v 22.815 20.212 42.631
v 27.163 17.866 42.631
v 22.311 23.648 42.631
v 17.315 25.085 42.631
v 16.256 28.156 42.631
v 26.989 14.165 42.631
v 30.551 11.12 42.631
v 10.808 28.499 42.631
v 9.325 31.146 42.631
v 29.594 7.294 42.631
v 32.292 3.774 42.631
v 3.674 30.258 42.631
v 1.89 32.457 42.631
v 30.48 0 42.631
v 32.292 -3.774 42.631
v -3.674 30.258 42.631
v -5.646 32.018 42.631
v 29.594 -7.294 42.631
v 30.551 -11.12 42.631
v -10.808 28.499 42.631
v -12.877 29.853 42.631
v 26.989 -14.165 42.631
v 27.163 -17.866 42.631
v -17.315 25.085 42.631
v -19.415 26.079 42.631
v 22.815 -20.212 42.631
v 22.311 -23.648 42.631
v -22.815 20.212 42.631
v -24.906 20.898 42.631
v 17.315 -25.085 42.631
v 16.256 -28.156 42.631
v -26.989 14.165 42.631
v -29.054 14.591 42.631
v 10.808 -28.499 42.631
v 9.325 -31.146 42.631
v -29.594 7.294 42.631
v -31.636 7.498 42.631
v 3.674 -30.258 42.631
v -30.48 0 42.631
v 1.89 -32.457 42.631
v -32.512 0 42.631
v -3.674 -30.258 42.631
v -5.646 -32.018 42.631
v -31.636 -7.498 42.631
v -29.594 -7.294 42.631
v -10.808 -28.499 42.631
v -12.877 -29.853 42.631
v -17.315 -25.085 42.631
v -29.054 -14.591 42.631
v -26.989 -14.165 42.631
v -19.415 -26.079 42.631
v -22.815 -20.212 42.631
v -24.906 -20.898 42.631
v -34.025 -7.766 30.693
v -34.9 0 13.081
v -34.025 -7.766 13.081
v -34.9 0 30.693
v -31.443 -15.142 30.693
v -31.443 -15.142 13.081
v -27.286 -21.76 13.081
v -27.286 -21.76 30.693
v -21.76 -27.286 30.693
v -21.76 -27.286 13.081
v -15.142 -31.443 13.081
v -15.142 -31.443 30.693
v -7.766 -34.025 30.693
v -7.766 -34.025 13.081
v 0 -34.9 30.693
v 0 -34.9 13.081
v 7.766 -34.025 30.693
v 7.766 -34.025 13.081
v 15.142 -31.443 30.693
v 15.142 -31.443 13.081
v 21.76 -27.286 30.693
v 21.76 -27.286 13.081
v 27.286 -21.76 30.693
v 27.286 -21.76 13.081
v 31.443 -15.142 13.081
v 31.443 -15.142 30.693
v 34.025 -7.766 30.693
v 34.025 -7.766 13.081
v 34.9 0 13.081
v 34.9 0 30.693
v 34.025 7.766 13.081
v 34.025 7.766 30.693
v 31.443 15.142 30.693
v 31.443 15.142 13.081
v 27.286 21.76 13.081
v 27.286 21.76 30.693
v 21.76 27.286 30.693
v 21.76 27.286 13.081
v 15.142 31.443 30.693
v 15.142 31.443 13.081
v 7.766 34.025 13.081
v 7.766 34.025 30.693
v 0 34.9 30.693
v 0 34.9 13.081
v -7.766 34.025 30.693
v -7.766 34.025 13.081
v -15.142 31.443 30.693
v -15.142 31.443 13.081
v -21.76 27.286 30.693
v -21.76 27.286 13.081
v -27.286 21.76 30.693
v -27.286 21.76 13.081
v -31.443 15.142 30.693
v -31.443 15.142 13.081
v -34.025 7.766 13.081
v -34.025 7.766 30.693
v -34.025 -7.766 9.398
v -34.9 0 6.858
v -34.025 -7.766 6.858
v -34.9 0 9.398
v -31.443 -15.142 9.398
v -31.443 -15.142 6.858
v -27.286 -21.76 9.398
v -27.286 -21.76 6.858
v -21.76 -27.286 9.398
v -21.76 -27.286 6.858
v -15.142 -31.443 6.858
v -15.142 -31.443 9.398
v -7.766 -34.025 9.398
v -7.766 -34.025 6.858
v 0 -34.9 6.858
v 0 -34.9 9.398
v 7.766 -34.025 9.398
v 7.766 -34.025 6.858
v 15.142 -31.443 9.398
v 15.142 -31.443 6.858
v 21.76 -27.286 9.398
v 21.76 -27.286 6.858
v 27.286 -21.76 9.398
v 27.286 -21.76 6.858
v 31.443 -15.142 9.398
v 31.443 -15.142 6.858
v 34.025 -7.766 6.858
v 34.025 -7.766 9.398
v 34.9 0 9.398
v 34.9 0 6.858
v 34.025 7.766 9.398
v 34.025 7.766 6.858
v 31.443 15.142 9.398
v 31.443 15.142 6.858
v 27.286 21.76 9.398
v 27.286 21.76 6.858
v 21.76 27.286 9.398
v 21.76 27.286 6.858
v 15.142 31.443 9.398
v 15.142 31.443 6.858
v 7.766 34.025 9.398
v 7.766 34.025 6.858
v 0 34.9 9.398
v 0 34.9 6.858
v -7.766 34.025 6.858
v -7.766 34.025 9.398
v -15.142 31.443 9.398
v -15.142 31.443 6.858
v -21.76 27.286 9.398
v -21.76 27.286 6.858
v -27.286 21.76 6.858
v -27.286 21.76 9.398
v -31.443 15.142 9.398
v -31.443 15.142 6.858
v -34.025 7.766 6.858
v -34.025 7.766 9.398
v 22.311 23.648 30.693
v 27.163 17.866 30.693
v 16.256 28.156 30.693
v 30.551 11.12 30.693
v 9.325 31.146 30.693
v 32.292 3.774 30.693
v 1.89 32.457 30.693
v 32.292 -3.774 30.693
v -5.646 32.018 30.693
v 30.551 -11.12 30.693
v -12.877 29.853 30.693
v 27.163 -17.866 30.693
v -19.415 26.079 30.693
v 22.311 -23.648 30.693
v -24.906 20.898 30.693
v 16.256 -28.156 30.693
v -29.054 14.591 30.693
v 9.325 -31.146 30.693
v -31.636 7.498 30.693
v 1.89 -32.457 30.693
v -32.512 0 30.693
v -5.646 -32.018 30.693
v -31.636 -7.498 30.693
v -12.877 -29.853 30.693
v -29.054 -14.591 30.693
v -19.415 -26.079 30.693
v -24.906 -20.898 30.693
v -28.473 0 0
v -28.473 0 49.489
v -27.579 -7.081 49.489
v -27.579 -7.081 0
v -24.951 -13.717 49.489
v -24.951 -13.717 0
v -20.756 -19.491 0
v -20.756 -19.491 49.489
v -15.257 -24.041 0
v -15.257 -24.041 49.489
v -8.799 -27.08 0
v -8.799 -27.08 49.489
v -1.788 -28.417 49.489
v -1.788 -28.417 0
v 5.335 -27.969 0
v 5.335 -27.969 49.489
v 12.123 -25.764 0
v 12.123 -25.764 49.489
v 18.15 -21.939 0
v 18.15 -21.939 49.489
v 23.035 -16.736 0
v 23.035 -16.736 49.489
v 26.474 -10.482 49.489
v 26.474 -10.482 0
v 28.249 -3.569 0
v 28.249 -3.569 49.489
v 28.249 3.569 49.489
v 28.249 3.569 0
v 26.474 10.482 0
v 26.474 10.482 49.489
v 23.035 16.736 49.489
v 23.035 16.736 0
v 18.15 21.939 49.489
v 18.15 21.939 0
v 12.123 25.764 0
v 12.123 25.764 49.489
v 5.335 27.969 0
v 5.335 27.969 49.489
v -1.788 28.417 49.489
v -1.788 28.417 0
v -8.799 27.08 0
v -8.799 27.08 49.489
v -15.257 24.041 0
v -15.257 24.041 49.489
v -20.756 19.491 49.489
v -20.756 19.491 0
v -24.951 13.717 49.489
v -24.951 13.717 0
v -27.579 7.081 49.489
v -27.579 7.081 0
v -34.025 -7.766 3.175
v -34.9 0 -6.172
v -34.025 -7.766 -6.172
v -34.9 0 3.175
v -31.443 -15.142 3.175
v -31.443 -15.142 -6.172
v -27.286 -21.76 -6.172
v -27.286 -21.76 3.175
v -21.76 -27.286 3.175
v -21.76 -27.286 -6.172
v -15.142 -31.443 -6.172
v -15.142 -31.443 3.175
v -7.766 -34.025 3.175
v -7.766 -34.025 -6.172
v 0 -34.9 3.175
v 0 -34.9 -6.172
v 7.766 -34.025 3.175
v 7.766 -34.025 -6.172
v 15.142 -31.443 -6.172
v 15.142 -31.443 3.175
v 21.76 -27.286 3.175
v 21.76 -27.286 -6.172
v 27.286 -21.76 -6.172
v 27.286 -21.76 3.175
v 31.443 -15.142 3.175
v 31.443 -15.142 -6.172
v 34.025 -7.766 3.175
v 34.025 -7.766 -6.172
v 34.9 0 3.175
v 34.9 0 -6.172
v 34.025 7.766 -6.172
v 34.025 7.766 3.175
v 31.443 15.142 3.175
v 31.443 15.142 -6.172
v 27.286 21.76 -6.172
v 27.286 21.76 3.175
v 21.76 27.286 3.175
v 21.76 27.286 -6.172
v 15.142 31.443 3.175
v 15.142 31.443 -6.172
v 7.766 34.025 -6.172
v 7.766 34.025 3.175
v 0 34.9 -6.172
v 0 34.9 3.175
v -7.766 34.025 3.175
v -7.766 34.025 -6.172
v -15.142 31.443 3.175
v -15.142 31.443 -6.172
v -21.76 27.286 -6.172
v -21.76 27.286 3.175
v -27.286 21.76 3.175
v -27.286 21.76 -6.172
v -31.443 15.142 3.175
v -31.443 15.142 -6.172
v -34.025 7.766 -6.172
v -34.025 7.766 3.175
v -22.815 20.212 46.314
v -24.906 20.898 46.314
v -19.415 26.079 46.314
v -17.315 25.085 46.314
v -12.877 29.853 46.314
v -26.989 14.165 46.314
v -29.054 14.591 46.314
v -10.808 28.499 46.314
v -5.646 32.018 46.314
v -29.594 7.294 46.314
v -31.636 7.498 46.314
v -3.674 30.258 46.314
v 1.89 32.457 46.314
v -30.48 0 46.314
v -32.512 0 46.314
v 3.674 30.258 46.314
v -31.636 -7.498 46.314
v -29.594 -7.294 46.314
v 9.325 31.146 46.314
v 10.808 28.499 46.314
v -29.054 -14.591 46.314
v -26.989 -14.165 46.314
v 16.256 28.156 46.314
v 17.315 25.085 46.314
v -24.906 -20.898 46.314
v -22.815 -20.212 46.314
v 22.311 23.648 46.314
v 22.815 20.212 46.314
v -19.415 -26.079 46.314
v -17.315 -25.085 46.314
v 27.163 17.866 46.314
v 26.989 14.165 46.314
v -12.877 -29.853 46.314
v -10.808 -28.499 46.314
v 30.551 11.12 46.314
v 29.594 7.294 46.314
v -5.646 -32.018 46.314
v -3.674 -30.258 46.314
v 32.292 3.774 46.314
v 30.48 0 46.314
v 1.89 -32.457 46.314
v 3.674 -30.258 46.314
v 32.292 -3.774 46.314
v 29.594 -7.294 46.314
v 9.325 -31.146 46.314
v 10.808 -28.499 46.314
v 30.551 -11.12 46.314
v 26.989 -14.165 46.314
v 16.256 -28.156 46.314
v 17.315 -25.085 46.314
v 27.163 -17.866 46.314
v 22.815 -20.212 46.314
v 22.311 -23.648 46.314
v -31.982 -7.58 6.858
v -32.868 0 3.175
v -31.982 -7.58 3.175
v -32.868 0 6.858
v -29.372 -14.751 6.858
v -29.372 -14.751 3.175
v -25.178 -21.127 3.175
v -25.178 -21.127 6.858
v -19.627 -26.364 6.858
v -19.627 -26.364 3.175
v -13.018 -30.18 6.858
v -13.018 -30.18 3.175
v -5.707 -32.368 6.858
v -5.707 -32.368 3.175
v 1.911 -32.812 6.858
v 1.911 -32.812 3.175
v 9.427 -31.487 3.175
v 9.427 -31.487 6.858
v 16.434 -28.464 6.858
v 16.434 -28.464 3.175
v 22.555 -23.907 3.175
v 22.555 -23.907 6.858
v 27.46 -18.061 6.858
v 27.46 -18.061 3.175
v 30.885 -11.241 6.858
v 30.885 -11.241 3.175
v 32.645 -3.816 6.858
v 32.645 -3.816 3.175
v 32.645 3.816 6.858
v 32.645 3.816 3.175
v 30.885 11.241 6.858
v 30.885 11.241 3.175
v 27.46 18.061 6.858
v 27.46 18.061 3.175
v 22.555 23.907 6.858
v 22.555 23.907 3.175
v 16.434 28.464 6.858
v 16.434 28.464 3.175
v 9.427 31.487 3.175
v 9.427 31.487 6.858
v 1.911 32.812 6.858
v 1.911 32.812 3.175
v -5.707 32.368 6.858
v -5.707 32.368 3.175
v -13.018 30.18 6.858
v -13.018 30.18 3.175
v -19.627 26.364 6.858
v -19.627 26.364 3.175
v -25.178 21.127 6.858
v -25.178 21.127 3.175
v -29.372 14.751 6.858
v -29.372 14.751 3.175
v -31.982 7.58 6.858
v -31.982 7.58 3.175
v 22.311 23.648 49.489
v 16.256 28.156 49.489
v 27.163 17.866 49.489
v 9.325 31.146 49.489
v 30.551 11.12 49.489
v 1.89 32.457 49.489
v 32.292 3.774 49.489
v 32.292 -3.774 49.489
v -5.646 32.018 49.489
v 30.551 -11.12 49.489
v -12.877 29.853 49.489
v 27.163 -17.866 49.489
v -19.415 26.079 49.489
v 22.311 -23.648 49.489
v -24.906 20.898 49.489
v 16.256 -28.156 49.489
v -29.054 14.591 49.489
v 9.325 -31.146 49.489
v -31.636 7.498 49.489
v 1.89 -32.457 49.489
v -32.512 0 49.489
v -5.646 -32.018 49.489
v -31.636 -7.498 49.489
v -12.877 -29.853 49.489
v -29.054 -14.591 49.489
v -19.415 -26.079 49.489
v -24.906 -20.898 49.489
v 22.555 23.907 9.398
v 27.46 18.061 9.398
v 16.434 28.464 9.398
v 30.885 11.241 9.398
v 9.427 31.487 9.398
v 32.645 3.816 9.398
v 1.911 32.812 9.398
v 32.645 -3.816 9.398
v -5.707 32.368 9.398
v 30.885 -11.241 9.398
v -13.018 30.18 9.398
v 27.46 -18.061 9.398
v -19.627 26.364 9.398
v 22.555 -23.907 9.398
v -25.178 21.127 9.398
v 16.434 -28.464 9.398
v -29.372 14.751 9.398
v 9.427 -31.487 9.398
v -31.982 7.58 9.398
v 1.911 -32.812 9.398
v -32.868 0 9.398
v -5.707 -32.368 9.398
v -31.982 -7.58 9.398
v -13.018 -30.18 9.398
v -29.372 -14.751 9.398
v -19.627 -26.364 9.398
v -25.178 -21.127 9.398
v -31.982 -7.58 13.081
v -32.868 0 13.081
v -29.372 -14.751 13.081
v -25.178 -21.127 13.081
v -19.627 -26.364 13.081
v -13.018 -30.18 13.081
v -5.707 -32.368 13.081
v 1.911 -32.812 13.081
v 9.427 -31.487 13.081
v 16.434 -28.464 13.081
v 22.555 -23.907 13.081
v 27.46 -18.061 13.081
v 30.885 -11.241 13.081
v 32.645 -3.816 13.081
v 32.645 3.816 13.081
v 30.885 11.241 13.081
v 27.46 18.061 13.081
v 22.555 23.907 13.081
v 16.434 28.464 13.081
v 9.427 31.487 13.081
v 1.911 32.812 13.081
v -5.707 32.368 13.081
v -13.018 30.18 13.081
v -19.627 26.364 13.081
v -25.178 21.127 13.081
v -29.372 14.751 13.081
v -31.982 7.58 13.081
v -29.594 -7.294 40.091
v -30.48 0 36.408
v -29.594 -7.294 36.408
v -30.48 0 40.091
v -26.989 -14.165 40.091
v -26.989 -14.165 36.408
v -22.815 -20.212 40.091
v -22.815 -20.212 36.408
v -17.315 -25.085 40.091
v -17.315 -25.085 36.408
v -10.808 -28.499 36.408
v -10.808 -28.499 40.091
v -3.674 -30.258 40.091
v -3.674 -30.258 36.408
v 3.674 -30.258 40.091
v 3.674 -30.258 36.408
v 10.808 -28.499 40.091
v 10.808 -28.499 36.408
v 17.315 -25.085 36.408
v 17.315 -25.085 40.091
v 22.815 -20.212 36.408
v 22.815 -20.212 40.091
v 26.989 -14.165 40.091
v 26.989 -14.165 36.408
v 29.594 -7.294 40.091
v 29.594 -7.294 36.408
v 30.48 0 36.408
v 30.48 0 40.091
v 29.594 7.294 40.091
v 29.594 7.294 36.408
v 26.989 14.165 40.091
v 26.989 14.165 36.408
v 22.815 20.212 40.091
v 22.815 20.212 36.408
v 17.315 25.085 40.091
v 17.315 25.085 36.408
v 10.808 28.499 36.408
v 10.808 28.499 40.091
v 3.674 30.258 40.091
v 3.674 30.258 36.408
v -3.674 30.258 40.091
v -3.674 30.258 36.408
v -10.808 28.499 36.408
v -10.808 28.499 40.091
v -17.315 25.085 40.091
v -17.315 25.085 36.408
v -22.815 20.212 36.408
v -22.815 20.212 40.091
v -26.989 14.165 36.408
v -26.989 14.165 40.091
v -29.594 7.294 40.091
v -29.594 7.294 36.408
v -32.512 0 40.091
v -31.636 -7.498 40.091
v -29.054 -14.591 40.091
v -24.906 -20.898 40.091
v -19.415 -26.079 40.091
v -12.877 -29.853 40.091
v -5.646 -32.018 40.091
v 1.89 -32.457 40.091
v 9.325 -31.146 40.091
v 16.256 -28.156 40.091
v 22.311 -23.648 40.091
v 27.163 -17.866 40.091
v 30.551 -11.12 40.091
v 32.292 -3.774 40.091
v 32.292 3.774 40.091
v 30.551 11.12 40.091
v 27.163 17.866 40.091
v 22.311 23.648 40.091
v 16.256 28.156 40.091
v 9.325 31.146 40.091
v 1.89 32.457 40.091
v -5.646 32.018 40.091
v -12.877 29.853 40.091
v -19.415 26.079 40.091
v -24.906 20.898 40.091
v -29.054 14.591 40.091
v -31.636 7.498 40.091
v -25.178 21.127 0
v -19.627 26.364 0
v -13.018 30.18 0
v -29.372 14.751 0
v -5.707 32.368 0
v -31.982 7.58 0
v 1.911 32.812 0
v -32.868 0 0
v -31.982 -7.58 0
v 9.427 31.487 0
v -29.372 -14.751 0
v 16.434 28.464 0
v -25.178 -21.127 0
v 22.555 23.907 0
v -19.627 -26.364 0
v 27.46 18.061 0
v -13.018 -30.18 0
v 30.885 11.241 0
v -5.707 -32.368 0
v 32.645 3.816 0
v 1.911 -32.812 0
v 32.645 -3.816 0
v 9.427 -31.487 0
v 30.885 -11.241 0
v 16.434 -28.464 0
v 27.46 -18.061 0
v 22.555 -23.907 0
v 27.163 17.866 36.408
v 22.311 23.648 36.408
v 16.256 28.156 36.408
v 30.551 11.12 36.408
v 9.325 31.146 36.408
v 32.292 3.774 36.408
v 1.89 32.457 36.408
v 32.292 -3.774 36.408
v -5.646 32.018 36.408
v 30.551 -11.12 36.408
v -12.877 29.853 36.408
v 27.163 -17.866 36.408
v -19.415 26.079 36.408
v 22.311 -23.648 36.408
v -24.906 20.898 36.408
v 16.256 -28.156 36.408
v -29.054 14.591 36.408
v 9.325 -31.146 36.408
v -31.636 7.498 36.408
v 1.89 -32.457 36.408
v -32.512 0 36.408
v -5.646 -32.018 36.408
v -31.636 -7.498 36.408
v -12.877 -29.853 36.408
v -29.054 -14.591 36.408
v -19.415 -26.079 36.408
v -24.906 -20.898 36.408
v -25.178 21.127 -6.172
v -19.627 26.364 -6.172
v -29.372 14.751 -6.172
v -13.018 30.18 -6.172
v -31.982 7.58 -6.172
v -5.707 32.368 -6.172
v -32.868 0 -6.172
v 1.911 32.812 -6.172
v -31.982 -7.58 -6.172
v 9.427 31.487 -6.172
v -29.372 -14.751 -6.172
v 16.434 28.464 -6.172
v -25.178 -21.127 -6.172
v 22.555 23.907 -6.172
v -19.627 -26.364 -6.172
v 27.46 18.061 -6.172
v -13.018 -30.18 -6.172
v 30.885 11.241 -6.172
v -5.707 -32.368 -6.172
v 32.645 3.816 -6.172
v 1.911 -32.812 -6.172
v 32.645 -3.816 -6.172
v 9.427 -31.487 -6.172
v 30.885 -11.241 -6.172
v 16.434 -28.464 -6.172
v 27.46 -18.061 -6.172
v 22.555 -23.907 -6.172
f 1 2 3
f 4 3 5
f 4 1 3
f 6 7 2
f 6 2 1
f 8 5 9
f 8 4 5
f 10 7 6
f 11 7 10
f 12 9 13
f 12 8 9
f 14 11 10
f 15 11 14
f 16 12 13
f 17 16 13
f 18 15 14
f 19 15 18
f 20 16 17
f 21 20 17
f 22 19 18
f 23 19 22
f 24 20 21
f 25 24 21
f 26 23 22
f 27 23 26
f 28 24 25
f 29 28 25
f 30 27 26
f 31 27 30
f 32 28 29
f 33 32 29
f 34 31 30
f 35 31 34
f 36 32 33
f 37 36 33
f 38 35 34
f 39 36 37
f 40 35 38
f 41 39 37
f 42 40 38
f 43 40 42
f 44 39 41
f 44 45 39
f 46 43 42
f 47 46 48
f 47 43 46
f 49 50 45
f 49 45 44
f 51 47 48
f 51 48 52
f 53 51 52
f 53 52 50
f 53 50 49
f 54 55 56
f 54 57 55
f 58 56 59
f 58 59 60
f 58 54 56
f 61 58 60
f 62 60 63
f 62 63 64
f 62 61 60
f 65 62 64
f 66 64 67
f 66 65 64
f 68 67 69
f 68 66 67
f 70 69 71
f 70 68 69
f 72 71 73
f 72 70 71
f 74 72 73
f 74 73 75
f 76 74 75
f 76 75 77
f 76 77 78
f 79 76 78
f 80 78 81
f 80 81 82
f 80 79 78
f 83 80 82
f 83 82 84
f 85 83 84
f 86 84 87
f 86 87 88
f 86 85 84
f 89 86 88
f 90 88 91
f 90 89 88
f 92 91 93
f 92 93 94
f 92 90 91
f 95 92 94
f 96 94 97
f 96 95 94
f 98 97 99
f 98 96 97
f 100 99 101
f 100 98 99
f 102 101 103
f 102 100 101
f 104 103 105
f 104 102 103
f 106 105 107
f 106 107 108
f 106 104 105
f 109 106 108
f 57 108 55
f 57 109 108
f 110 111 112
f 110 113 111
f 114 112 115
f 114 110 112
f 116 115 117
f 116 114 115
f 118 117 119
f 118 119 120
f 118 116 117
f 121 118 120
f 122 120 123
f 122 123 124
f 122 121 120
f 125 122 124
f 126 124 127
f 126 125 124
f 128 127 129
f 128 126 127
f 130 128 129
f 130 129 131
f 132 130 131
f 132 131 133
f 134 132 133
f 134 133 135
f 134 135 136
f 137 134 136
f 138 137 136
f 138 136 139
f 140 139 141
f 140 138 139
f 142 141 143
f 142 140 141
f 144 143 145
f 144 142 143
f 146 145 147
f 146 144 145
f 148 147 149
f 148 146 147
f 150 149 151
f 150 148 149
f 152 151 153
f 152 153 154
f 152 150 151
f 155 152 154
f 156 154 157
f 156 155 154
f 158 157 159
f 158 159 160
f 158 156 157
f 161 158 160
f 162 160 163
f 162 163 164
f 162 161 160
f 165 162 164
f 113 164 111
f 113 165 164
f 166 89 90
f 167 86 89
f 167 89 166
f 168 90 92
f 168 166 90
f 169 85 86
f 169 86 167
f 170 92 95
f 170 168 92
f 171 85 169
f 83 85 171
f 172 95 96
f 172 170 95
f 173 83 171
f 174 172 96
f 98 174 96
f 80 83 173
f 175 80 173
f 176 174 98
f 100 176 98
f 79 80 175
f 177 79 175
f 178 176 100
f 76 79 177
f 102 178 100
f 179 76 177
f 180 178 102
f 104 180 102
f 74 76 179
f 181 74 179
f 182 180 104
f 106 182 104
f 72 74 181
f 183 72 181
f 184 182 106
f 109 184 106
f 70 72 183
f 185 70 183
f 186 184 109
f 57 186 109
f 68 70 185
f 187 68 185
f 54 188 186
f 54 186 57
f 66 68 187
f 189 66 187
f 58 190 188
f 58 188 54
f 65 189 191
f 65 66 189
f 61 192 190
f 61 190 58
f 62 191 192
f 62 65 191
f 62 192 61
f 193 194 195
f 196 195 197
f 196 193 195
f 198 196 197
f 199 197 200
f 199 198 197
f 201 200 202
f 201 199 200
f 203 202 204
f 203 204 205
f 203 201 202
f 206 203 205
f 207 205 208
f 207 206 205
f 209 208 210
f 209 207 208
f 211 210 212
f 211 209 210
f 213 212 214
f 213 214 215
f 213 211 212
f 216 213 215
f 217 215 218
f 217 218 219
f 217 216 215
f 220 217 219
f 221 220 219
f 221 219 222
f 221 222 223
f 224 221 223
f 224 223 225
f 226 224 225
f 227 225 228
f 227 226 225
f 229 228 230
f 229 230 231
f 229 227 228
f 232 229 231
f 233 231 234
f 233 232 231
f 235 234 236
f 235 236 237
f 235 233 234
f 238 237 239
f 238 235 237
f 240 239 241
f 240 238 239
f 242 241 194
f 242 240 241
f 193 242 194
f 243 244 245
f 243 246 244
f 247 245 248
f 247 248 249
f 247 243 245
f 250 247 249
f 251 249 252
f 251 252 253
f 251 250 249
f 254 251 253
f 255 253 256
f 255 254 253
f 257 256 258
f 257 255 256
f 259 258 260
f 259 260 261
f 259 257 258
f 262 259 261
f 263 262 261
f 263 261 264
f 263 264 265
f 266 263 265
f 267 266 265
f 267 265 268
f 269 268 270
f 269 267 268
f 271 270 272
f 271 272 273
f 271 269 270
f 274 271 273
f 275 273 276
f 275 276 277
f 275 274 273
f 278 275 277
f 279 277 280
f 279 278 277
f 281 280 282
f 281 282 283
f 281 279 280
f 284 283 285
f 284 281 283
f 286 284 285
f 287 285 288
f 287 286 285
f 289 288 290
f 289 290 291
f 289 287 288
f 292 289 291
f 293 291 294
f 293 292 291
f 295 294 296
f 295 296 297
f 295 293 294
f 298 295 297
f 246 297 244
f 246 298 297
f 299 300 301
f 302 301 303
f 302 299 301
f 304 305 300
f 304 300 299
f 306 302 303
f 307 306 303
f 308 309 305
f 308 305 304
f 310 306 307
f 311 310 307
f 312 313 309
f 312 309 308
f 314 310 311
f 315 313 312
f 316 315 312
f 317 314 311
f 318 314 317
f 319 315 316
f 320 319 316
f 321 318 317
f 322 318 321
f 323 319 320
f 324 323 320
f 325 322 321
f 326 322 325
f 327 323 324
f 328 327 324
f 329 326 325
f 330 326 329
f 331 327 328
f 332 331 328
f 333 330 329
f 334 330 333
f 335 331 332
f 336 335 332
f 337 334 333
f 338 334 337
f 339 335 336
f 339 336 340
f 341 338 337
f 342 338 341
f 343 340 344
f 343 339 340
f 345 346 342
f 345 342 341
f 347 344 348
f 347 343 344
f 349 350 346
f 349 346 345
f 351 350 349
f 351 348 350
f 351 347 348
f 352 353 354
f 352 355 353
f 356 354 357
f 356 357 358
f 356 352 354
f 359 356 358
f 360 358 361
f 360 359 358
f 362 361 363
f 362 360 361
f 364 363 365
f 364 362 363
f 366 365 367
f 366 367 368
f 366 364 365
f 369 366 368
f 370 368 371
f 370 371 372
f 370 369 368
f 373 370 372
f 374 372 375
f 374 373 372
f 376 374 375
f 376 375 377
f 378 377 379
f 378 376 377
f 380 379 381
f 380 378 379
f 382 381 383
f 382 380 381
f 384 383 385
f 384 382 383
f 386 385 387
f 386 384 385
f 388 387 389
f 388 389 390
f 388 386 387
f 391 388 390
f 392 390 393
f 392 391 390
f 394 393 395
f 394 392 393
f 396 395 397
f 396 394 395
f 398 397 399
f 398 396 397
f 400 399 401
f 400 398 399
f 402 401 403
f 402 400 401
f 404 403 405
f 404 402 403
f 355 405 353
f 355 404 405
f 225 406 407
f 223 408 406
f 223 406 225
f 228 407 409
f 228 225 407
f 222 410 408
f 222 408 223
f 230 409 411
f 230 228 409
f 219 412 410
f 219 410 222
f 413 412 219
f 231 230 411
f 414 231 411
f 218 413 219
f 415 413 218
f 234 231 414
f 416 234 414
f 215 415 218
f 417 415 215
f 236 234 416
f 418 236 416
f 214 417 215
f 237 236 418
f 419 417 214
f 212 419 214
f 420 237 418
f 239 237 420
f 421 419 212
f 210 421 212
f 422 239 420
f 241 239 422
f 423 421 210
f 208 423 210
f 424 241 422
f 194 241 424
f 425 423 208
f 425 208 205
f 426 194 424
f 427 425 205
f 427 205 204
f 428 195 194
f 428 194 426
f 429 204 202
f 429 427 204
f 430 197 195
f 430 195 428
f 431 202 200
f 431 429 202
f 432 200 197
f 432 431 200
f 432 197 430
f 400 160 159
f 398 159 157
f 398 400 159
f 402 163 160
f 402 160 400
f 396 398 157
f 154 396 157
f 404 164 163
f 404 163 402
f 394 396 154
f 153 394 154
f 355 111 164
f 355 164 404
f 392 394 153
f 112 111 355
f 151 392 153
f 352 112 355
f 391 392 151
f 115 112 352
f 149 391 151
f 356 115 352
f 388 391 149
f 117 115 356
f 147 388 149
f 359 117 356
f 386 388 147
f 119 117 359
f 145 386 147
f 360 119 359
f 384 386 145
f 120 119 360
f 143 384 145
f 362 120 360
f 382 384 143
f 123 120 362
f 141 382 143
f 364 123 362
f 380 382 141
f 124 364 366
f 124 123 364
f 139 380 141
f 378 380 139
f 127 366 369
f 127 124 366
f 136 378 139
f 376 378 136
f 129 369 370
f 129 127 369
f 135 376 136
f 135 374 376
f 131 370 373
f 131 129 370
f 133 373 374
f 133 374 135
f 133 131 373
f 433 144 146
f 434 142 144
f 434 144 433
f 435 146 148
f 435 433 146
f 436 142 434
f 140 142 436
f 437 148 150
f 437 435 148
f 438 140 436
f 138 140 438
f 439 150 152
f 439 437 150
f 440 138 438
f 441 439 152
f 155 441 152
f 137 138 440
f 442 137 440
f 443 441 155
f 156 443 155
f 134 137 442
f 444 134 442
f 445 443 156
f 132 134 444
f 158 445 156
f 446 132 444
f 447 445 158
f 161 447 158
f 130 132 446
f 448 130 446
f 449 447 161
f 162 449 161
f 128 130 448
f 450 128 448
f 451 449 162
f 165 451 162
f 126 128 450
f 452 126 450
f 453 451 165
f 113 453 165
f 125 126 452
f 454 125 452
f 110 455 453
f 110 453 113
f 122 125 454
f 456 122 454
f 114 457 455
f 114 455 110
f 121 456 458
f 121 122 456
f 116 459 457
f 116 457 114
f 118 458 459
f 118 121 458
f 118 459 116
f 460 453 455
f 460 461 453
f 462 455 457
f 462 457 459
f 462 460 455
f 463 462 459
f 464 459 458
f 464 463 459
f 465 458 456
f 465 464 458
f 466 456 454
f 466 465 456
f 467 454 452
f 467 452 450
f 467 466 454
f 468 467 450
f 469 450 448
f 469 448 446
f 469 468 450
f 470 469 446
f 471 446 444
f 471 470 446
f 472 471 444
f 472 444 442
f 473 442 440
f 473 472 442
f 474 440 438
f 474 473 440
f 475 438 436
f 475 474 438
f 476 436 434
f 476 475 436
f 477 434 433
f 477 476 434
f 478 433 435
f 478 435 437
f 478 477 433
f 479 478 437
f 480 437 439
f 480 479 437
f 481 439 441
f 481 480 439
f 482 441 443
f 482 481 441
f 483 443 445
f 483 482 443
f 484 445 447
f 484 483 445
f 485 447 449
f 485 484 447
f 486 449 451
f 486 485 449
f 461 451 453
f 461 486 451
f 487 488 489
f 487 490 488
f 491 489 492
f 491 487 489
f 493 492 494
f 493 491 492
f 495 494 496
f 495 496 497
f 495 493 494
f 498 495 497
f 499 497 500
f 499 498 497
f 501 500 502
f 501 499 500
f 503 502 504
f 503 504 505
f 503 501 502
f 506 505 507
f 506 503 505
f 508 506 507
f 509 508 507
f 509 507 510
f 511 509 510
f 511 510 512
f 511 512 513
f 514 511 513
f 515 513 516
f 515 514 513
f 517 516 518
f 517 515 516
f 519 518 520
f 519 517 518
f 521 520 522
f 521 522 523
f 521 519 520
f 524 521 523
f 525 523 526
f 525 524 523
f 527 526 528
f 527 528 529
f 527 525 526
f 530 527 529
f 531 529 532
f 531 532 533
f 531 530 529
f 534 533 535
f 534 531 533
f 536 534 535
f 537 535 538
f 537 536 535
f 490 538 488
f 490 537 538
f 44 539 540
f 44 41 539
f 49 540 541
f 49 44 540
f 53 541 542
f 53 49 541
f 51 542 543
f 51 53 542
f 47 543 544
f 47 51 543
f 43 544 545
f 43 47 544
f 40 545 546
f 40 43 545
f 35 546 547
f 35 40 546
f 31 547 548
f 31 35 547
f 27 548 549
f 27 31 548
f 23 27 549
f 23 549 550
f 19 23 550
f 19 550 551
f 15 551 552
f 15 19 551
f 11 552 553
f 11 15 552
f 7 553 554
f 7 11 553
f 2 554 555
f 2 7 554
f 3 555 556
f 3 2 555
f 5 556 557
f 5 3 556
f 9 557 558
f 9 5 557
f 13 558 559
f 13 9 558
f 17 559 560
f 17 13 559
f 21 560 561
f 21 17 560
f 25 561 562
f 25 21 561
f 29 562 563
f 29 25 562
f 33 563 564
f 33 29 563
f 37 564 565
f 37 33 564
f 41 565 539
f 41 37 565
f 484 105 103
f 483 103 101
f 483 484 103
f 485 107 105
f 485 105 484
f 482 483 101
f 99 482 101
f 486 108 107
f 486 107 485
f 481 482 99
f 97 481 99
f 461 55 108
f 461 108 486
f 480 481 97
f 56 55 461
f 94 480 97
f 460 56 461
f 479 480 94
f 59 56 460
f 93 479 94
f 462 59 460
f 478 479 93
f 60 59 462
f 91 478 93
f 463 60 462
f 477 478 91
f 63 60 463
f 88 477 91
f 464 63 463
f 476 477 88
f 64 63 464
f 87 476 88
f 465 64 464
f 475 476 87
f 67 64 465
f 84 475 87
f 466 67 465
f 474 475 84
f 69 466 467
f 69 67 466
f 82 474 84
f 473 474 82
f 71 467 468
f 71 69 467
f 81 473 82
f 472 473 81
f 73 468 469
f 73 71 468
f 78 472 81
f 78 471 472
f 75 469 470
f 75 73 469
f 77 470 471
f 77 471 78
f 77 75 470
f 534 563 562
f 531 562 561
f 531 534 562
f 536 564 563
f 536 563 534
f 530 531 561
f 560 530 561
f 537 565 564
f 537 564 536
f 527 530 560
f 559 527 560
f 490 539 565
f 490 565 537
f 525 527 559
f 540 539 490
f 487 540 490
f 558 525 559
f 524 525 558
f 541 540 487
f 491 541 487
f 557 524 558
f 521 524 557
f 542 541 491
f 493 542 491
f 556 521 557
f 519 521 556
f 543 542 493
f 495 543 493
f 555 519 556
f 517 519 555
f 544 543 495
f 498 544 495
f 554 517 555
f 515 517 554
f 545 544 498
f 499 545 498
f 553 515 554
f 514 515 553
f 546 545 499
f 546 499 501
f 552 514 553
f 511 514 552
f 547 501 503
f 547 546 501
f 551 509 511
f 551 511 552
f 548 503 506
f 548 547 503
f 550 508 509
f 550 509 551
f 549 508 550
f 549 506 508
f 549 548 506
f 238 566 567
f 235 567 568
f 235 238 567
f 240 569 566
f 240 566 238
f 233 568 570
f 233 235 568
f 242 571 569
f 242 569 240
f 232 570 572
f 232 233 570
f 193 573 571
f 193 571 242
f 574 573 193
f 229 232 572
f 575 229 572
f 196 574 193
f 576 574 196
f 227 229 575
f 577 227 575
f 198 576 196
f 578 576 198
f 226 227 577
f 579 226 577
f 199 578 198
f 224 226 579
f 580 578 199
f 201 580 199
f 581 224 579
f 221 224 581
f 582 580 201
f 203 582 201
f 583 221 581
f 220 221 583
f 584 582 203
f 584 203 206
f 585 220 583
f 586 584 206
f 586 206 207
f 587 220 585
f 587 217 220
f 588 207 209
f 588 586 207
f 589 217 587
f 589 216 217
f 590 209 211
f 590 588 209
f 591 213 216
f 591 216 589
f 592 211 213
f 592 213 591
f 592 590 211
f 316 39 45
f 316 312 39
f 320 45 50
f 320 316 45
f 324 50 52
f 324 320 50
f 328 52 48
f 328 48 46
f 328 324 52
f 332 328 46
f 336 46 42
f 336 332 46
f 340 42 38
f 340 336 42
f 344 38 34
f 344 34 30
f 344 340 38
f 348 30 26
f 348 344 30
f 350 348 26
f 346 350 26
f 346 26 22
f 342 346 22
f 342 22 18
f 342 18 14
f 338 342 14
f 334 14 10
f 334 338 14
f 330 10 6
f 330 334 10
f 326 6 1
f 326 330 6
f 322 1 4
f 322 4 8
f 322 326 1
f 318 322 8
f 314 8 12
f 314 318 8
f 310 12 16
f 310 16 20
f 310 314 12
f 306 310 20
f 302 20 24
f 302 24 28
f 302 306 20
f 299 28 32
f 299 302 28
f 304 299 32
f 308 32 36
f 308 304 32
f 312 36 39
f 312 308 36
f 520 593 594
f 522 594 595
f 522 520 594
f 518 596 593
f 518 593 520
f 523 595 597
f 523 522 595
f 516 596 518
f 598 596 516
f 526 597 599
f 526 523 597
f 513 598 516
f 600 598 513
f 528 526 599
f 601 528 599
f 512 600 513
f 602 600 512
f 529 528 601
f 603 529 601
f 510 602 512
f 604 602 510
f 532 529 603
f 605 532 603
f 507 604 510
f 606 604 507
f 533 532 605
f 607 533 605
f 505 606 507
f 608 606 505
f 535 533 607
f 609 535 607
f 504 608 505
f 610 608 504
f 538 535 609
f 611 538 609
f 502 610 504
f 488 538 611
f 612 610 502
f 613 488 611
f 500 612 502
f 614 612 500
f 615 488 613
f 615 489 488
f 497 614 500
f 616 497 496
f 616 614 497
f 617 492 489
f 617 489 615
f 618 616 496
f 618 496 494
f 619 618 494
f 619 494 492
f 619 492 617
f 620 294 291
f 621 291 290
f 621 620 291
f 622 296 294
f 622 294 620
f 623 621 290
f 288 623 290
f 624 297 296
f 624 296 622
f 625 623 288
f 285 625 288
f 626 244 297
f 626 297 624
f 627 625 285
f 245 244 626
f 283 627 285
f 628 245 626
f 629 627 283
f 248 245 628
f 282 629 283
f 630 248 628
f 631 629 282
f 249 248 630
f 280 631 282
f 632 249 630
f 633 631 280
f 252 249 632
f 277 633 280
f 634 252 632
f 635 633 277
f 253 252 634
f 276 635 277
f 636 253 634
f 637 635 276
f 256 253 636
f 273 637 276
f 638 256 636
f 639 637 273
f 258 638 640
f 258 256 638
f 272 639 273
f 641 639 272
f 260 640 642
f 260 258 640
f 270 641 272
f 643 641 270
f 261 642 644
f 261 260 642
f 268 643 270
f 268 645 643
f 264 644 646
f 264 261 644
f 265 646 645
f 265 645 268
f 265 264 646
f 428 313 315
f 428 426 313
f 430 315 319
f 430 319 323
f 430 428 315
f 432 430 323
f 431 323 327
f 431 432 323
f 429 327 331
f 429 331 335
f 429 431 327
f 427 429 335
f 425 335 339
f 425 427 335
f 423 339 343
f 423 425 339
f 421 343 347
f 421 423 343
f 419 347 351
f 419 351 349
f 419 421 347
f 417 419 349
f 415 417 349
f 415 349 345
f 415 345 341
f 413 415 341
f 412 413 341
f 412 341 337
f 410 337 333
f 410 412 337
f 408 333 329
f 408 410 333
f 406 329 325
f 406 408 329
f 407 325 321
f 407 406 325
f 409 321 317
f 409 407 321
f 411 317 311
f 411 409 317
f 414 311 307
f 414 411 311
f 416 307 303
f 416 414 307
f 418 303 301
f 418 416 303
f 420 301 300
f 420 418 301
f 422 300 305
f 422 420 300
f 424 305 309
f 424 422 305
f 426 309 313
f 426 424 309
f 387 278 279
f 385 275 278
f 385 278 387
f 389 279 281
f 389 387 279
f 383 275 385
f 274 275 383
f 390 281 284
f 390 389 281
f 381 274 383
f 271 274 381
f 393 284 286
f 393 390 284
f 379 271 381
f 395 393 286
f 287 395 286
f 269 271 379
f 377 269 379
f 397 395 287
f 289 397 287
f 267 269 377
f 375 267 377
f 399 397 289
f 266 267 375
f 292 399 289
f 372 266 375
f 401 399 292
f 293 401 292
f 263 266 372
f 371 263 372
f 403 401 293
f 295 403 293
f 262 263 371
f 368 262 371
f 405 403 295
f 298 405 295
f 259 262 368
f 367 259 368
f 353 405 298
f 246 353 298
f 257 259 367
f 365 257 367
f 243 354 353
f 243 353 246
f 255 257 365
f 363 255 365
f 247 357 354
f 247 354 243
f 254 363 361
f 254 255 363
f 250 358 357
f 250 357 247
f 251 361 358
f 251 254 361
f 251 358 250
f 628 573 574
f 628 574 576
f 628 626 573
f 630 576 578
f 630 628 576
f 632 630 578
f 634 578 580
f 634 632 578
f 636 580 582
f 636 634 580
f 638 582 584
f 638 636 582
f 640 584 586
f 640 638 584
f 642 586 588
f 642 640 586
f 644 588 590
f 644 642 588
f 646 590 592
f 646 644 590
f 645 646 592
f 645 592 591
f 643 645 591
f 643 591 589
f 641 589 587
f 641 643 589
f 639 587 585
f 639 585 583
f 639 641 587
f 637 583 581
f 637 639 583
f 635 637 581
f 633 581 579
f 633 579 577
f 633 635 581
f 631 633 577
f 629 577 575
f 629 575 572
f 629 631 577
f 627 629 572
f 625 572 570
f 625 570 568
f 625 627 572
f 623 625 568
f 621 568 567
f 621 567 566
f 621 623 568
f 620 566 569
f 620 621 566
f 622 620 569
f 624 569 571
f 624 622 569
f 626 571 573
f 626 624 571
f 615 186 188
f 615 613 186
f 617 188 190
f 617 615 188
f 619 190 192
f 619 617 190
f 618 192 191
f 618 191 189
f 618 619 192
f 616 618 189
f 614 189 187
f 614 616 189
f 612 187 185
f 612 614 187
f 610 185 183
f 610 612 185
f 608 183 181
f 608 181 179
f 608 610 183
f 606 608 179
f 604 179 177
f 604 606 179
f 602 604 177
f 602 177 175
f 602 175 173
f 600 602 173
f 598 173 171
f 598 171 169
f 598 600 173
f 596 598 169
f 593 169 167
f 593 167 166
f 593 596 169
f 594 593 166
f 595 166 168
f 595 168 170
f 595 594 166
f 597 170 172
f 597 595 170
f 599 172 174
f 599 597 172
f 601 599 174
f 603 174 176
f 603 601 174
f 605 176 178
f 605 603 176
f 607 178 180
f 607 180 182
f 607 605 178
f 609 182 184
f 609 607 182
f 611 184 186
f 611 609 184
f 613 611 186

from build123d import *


with BuildPart() as part:
    # Sketch1 → Revolve1 (O-Rings : 2-141 & 2-144) (revolve)
    with BuildSketch(Plane(origin=(0, 0, 0), x_dir=(0, 0, -1), z_dir=(1, 0, 0)), mode=Mode.PRIVATE) as revolve1_o_rings_2_141_2_144_sk:
        Polygon((0, 28.4734), (0, 32.8676), (6.1722, 32.8676), (6.1722, 34.8996), (-3.175, 34.8996), (-3.175, 32.8676), (-6.858, 32.8676), (-6.858, 34.8996), (-9.398, 34.8996), (-9.398, 32.8676), (-13.081, 32.8676), (-13.081, 34.8996), (-30.69336, 34.8996), (-30.69336, 32.512), (-36.40836, 32.512), (-36.40836, 30.48), (-40.09136, 30.48), (-40.09136, 32.512), (-42.63136, 32.512), (-42.63136, 30.48), (-46.31436, 30.48), (-46.31436, 32.512), (-49.48936, 32.512), (-49.48936, 28.4734), align=None)
    revolve(revolve1_o_rings_2_141_2_144_sk.sketch.rotate(Axis((0, 0, 0), (0, 0, 1)), 90), axis=Axis((0, 0, 0), (0, 0, 1)))


solid = part.part
